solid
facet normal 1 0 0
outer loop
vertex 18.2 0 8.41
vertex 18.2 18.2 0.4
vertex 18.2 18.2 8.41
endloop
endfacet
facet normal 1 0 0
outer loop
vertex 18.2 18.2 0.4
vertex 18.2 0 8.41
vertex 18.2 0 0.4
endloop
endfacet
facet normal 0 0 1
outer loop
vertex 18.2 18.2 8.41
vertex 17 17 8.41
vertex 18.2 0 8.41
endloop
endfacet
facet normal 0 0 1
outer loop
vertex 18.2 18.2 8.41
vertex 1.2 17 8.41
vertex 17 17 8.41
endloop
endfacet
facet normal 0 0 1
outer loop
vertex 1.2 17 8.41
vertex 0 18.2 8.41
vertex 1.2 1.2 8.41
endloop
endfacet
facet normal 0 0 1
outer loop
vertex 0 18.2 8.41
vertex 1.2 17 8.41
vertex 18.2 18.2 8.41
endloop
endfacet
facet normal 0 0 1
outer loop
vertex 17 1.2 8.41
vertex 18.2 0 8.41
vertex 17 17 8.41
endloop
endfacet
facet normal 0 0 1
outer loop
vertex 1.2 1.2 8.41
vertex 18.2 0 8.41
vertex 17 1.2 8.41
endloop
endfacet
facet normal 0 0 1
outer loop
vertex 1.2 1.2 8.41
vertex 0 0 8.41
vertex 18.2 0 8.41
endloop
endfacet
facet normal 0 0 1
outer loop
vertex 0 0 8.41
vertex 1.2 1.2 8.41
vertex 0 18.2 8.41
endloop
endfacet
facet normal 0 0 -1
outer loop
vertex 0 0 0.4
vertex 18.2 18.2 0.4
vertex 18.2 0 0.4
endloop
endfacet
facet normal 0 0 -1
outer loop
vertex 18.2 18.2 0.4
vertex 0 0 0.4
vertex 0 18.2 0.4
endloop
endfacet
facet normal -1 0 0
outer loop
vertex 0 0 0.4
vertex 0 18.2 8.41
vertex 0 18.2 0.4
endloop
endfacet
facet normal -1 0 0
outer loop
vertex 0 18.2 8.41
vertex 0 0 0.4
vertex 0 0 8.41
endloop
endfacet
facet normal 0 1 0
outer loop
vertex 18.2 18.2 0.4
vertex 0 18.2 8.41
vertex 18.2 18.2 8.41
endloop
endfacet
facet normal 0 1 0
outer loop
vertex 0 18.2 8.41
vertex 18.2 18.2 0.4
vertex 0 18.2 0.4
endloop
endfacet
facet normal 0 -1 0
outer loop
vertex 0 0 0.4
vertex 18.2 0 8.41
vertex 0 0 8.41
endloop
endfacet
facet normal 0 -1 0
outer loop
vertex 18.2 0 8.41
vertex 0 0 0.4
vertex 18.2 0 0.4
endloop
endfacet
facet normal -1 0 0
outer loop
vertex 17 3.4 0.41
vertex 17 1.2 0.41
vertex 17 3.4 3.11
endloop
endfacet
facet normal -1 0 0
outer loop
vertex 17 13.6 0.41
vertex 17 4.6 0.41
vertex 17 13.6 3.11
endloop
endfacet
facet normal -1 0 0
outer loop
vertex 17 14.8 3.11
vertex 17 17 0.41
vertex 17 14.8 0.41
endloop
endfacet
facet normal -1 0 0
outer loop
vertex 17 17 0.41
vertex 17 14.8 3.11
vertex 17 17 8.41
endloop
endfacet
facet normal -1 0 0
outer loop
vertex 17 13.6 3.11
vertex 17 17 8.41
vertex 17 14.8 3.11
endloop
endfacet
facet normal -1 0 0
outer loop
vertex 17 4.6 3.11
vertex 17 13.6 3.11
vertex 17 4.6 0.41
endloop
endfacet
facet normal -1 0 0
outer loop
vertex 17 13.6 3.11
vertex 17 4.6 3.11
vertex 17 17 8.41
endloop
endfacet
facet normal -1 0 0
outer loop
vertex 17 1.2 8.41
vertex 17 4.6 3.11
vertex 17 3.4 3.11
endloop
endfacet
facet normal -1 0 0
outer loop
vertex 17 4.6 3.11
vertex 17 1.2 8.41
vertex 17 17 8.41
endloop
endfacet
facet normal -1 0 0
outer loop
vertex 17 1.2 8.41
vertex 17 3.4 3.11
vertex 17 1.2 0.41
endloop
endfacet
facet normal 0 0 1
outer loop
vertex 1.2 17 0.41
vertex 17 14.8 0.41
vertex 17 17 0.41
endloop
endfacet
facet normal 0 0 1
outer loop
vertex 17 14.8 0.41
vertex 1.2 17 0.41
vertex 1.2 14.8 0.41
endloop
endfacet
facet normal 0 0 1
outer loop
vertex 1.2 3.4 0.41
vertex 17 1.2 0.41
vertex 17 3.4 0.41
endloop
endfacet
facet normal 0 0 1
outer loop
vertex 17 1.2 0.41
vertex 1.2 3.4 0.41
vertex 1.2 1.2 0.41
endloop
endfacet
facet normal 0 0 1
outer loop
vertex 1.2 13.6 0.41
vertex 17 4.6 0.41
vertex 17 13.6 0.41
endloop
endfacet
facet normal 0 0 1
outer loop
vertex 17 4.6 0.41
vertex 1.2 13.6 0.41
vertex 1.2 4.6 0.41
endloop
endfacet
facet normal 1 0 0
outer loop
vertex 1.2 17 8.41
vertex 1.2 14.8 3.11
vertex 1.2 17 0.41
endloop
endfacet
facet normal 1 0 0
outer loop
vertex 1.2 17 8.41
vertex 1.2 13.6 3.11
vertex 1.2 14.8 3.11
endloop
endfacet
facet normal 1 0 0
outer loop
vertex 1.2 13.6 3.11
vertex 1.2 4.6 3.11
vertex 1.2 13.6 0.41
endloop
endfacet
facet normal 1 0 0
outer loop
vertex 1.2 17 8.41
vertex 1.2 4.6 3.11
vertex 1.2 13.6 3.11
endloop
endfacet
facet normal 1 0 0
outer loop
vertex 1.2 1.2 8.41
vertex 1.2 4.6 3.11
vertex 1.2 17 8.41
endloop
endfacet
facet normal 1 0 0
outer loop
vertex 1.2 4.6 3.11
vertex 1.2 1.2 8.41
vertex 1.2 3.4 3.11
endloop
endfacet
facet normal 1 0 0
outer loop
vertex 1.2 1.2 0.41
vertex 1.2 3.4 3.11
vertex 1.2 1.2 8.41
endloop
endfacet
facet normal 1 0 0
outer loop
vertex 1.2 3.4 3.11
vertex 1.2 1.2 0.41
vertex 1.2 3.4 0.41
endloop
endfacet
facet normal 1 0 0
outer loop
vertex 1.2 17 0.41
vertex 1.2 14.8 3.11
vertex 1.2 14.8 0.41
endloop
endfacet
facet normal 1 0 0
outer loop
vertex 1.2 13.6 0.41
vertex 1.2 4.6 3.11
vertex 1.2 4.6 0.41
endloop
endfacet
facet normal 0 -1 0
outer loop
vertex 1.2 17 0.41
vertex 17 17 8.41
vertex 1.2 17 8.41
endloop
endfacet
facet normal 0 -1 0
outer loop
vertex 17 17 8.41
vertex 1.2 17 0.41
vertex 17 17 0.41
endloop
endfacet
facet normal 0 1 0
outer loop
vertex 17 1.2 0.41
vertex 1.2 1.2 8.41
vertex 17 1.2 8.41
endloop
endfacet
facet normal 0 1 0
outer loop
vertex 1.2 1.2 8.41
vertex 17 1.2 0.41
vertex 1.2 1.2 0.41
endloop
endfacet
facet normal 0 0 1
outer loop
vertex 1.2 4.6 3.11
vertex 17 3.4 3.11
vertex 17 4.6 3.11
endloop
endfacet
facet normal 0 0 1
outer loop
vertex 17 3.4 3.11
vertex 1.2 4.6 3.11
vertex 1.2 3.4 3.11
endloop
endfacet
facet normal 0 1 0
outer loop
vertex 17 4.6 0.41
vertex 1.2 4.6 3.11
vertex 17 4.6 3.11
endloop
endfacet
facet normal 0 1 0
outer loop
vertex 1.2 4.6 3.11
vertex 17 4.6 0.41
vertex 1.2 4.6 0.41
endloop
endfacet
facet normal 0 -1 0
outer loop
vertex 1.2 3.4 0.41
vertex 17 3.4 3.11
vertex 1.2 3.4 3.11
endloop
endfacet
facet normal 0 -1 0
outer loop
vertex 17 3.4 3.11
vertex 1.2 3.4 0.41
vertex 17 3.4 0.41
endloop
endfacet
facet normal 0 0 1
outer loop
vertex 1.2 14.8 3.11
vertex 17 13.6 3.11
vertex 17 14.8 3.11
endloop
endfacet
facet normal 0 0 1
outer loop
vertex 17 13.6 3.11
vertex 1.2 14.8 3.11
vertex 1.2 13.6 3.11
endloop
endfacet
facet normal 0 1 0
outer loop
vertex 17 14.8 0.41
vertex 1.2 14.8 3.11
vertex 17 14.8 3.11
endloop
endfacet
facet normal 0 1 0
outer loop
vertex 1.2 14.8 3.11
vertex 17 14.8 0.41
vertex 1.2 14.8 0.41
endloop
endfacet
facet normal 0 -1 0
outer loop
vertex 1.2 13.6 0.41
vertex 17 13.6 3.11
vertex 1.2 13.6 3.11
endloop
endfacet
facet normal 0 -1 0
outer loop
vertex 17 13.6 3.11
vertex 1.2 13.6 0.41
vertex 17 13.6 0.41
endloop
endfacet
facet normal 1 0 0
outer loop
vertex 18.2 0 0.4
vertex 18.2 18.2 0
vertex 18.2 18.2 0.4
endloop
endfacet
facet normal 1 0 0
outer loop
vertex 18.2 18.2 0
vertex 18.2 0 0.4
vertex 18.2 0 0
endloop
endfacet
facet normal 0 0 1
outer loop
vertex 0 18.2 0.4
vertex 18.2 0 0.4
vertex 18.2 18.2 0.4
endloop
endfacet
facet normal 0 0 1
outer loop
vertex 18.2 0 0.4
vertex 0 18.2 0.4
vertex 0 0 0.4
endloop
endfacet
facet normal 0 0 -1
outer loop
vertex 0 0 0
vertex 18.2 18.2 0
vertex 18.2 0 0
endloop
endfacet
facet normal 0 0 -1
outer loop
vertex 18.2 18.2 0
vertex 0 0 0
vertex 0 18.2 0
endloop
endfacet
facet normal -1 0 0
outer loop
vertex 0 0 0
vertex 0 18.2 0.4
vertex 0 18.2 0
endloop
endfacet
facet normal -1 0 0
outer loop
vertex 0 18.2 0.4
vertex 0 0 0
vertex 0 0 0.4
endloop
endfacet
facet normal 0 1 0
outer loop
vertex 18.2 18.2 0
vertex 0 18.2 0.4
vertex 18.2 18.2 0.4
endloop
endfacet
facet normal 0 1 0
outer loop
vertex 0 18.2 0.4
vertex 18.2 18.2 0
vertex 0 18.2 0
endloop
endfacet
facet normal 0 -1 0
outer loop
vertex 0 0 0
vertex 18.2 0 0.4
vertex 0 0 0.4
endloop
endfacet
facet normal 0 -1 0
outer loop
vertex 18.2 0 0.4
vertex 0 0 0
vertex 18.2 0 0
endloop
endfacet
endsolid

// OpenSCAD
// file: ../../Base/Rotation.scad
// Fischertechnik Box Foundation
// Geometry Helpers Rotation

include <PlacementOptions.scad>

// getRotatedSpace(space, rotation=NoRotation)
// Rotates the space dependent on the specified rotation

function getRotatedSpace(space, rotation=NoRotation) = [
    (rotation == Rotate90 || rotation == Rotate270) ? space.y : space.x,
    (rotation == Rotate90 || rotation == Rotate270) ? space.x : space.y
];

// Rotates the given space around the fixed left lower corner
// space = the space the children needs as width/depth list [width,depth]
// rotation = 0 Rotate0 degrees, 1 Rotate90 degrees, 2 Rotate180 degrees, 3 Rotate270 degrees (equivalent to -90)

module RotateFix(space, rotation=NoRotation) {
    dy = (rotation == Rotate0 || rotation == Rotate270) ? 0 :
        (rotation == Rotate90) ? space.x :
        space.y;
    dx = (rotation < Rotate180) ? 0 :
        (rotation == Rotate180) ? space.x :
        space.y;
    
    translate([dx, dy, 0])
        rotate([0, 0, rotations[rotation]])
            children();
}
// file: ../../Base/Alignment.scad
// Fischertechnik Box Foundation
// Geometry Helpers Alignment

include <PlacementOptions.scad>

// getAlignedX(elementWidth, spaceWidth, align=AlignRight, offset=0)
// Gets the aligned X offset of an element with the given
// width in the given space.
// elementWidth = The width of the element to positon
// spaceWidth = The space where the element should be aligned
// align = 0 AlignLeft, 1 AlignCenter, 2 AlignRight
// offset = an optional offset from the aligned position. When
// aligned left or centered, then positive values are in X direction.
// When aligned right then positive values are in negative X direction.

function getAlignedX(elementWidth, spaceWidth, align=AlignRight, offset=0) =
    (align == AlignLeft) ?
        offset :
        ((align == AlignCenter) ?
        (spaceWidth - elementWidth)/2 + offset :
        spaceWidth - offset - elementWidth);

// getAlignedY(elementDepth, spaceDepth, align=AlignTop, offset=0)
// Gets the aligned Y offset of an element with the given
// depth in the given space.
// elementDepth = The depth of the element to positon
// spaceDepth = The space where the element should be aligned
// align = 0 AlignBottom, 1 AlignCenter, 2 AlignTop
// offset = an optional offset from the aligned position. When
// aligned bottom or centered, then positive values are in Y direction.
// When aligned top then positive values are in negative Y direction.

function getAlignedY(elementDepth, spaceDepth, align=AlignTop, offset=0) =
    (align == AlignBottom) ?
        offset :
        ((align == AlignCenter) ?
        (spaceDepth - elementDepth)/2 + offset :
        spaceDepth - offset - elementDepth);
// file: ../../Base/PlacementOptions.scad
// Fischertechnik Box Foundation
// Placement Options

// Alignment
NoAlign = 0;
AlignLeft = 1;
AlignBottom = 2;
AlignCenter = 3;
AlignRight = 4;
AlignTop = 5;

// Element rotation degree steps
rotations = [0, -90, -180, -270];

// Rotation
NoRotation = 0;
Rotate0 = 0;
Rotate90 = 1;
Rotate180 = 2;
Rotate270 = 3;

// Docking (seen from above)
NoDock = -1;
DockLeft = 0;
DockTop = 1;
DockRight = 2;
DockCorner = 2;
DockBottom = 3;

// Web corners
LowerLeft = 0;
UpperLeft = 1;
UpperRight = 2;
LowerRight = 3;

// Web position relative to corner
LeftOfCorner = 0;
RightOfCorner = 1;
// file: ../../Base/Boxes.scad
// Fischertechnik Box Foundation
// Pre-designed Boxes

use <Constants.scad>

include <PlacementOptions.scad>

box190Width = 190;
box190Depth = 130;
box130Width = 130;
box130Depth = 95;

// Values are from an original ec3 box
topBottomDifference = 1.5;
outerHeight = 40;
innerHeight = 38.2;
baseThickness = outerHeight - innerHeight;
stackExcess = 5.7;
radius = 3.5;
wallThickness = 1.5;
tolerance = 0.2;
stackOffset = innerHeight - stackExcess;

boxUsageHeight = stackOffset;
boxWallThickness = wallThickness;
boxBaseThickness = baseThickness;
boxWebWidth = 3.0;

// getBoxWallThickness()
// Gets the wall thickness of a Fischertechnik Box
function getBoxWallThickness() = boxWallThickness;

// getBoxUsageHeight()
// Gets the usable height of a Fischertechnik box
function getBoxUsageHeight() = boxUsageHeight;

// getBoxInnerHeight()
// Gets the inner height of a Fischertechnik box, including the stack excess
function getBoxInnerHeight() = innerHeight;

// getBoxBaseThickness()
// Gets the thickness of the Fischertechnik box base.
function getBoxBaseThickness() = boxBaseThickness;

// getBoxWebWidth()
// Gets the width of a box web
function getBoxWebWidth() = boxWebWidth;

// getBox190Space()
// Gets the usable inner space of a Box 190 as an x/y-list
function getBox190Space() = [
    box190Width - 2*getBoxWallThickness() - topBottomDifference, 
    box190Depth - 2*getBoxWallThickness() - topBottomDifference ];

// BoxBase(width, depth)
// Creates an empty stackable Fischertechnik compatible box
// width = Outer width of the box (190, 130, ...)
// depth = Outer depth of the box (130, 95, ...)

module BoxBase(width, depth, height=outerHeight) {    
    thinPlate = 0.01;

    innerHeight = height - baseThickness;    
    
    module BodyPlate(width, depth) {
        translate([radius, radius])
        hull() {
            w = width-2*radius;
            d = depth-2*radius;
            cube([w, d, thinPlate]);
            cylinder(thinPlate, r=radius, $fn=getFragments());
            translate([w, 0])
                cylinder(thinPlate, r=radius, $fn=getFragments());
            translate([w, d])
                cylinder(thinPlate, r=radius, $fn=getFragments());
            translate([0, d])
                cylinder(thinPlate, r=radius, $fn=getFragments());
        }
    }
    
    module Body(tolerance=tolerance) {
        hull() {
            // Bottom with tolerance to fit into the original boxes when stacked
            translate([-wallThickness+tolerance, -wallThickness+tolerance, -baseThickness])
                BodyPlate(width-topBottomDifference-2*tolerance, depth-topBottomDifference-2*tolerance);
            
            // Top
            translate([-wallThickness-topBottomDifference/2, -wallThickness-topBottomDifference/2, innerHeight-thinPlate])
                BodyPlate(width, depth);
         }
    }

    module Cutoff() {
        hull() {
            coWidth = width - 2*wallThickness;
            coDepth = depth - 2*wallThickness;
            
            // Bottom
            BodyPlate(coWidth-topBottomDifference, coDepth-topBottomDifference);

            // Top
            translate([-topBottomDifference/2, -topBottomDifference/2, innerHeight+thinPlate]) 
                BodyPlate(coWidth, coDepth);
        }
    }
    
    difference() {        
        Body();
        Cutoff();
        stackOffset = innerHeight - stackExcess;
        translate([0, 0, stackOffset + baseThickness])
            Body(tolerance=0);
    }
}

// Creates the Fischertechnik empty box 130x190 mm and places it at position 0,0
// 190x130 are the outer sizes, the inner space is slightly smaller. Use getBox190Space() to get the inner sizes.
// The box is positioned that the usable inner space is at the 0,0,0 position. The

module Box190() {
    BoxBase(box190Width, box190Depth);
}

// Gets the usable inner space of a Box 130 as an x/y-list
function getBox130Space() = [
    box130Width - 2*getBoxWallThickness() - topBottomDifference, 
    box130Depth - 2*getBoxWallThickness() - topBottomDifference ];

// Creates the Fischertechnik empty box 95x130 mm and places it at position 0,0
// 190x130 are the outer sizes, the inner space is slightly smaller. Use getBox190Space() to get the inner sizes.
// The box is positioned that the usable inner space is at the 0,0,0 position. The

module Box130() {
    BoxBase(box130Width, box130Depth);
}

// Creates a web at the specified box walls
// corner 0 = LowerLeft, 1 = UpperLeft, 2 = UpperRight, 3 = LowerRight
// side 0 = LeftOfCorner, 1 = RightOfCorner
// distance = Distance in mm from the corner
// boxSpace = inner width and depth of the box (default: Box 190)
// webWidth = length of the web (default is 3 mms)
// webThickness = thickness of the web (default is 1 mm)

module BoxWeb(corner, side, distance, boxSpace=getBox190Space(), webWidth=getBoxWebWidth(), webThickness=1.0) {
    sink = getBoxWallThickness()/2;

    width = (corner % 2 == 0) ? 
            (side == LeftOfCorner ? webWidth : webThickness) :
            (side == LeftOfCorner ? webThickness : webWidth);

    depth = (corner % 2 == 0) ? 
            (side == RightOfCorner ? webWidth : webThickness) :
            (side == RightOfCorner ? webThickness : webWidth);
    
    xDiff = corner == LowerLeft ? 
                (side == LeftOfCorner ? -sink : distance) :
            (corner == UpperLeft ?                
                (side == LeftOfCorner ? distance : -sink) :
            (corner == UpperRight ?
                (side == LeftOfCorner ? boxSpace.x-webWidth+sink : boxSpace.x-distance-webThickness) :
                (side == LeftOfCorner ? boxSpace.x-distance-webThickness: boxSpace.x-webWidth+sink)));

    yDiff = corner == LowerLeft ? 
                (side == RightOfCorner ? -sink : distance) :
            (corner == UpperLeft ?
                (side == RightOfCorner ? boxSpace.y-distance : boxSpace.y-webWidth+sink) :
            (corner == UpperRight ?
                (side == RightOfCorner ? boxSpace.y-webWidth+sink : boxSpace.y-distance) :
                (side == RightOfCorner ? distance : -sink)));
    
    translate([xDiff, yDiff, -getExcess()])
        cube([width, depth, boxUsageHeight + 2*getExcess()]);
}
// file: ../../Base/Placement.scad
// Fischertechnik Box Foundation
// Geometry Helpers Placement

use <Constants.scad>
use <Alignment.scad>
use <Rotation.scad>
use <Boxes.scad>

include <PlacementOptions.scad>

// Place(x=0, y=0, elementSpace=[0,0], alignX=AlignLeft, alignY=AlignBottom, rotation=Rotate0, boxSpace=getBox190Space())
// Places the child at the specified position
// y = Y-Position. This is a relative position when an X aligment is specified.
// x = X-Position. This is a relative position when an Y aligment is specified.
// elementSpace = space of the element to be placed [x,y]
// alignX = -1=NoAlign, 0 AlignLeft, 1 AlignCenter, 3 AlignRight (elementSpace and boxSpace required!)
// alignY = -1=NoAlign, 2 AlignBottom, 1 AlignCenter, 4 AlignTop (elementSpace and boxSpace required!)
// rotation = 0 Rotate0 0 degrees, 1 Rotate90 90 degrees, 
// 2 Rotate180 180 degrees, 3 Rotate270 270 degrees (equivalent to -90)
// boxSpace = Inner space of the box where the placement occurs [x,y] - default is Box 190x130 inner space

module Place(x=0, y=0, elementSpace=[0,0], 
  alignX=AlignLeft, alignY=AlignBottom, 
  rotation=NoRotation, boxSpace=getBox190Space()) {

    module Position(x, y, space, rotation=Rotate0) {
        translate([x, y, 0])
            RotateFix(space, rotation)
                children();
    }

    space = getRotatedSpace(elementSpace, rotation);
    alignedX = getAlignedX(space.x, boxSpace.x, alignX, x);
    alignedY = getAlignedY(space.y, boxSpace.y, alignY, y);
    Position(alignedX, alignedY, elementSpace, rotation)
        children();
}

// Center(space=getBox130Space(), elementSpace=[0,0])
// space = Space where the children is centered. For cylinder use centered=true and no elementSpace.
// elementSpace = space of the element to be centered [x,y]

module Center(space=getBox190Space(), elementSpace=[0,0]) {
    Place(elementSpace=elementSpace, boxSpace=space, alignX=AlignCenter, alignY=AlignCenter)
        children();
}

// CenterHorizontal(width=0, y=0, offset=0, space=getBox130Space())
// width = Width of the element to be placed.
// y = Y position of the element
// offset = Offset from the center position (negative will be left of the center)
// space = Space where the element is placed

module CenterHorizontal(width=0, y=0, offset=0, space=getBox190Space()) {
    Place(x=offset, y=y, elementSpace=[width, 0], boxSpace=space, alignX=AlignCenter)
        children(0);
}

// CenterVertical(depth=0, x=0, offset=0, space=getBox130Space())
// depth = Depth of the element to be placed.
// x = X position of the element
// offset = Offset from the center position (negative will be down of the center)
// space = Space where the element is placed

module CenterVertical(depth=0, x=0, offset=0, space=getBox190Space()) {
    Place(x=x, y=offset, elementSpace=[0, depth], boxSpace=space, alignY=AlignCenter)
        children(0);
}

// getIsVertical(align)
// True if the specified alignment needs a vertical orientation for a divider (AlignRight, AlignLeft)

function getIsVertical(align) = (align == AlignRight || align == AlignLeft);

// getIsHorizontal(align)
// True if the specified alignment needs a horizontal orientation for a divider (AlignTop, AlignBottom)

function getIsHorizontal(align) = (align == AlignTop || align == AlignBottom);
// file: ../../Elements/AxisClip10.scad
// Fischertechnik Box Library
// Axis for clip 10
// 31023

use <../ModelBase/Simple.scad>
use <../Base/Constants.scad>

width = 12;
depth = 12;
height = 23;
upperDiameter = 3.6;
clipHeight = 10;

// getAxisClip10Space()
// Gets the space of a frame for a clip 10 with spring ring (mot2)

function getAxisClip10Space() = [width, depth, height];

// AxisClip10(height, clipHeight)
// Axis for clip 10 with spring ring (mot2)
// height = Height of the complete axis
// clipHeight = Height of the rt for the clip (standard is 10, in mot3 its only 7)

module AxisClip10(height=height, clipHeight=clipHeight) {
    LeveledAxisWithSpace(height, height-clipHeight, getAxisClip10Space(), diameter=upperDiameter);
}

// Tests
color("lightgray")
AxisClip10();
// file: ../../Base/Constants.scad
// Fischertechnik Box Foundation
// Constants

// Constant values necessary for multiple elements

// Base constants
dividerThickness = 1.2;
excess = 0.01;
fragments = 90;
tolerance = 0.8;

// Gets the thickness of a divider 
function getDividerThickness() = dividerThickness;

// Gets the excess that is used to merge walls into each other
function getExcess() = excess;

// Gets amount of fragments of a cylinder
function getFragments() = fragments;

// Gets the inner tolerance of a frame to each side
function getTolerance() = tolerance;


// Fischertechnik specific constants
axisDiameter = 4;
axisBottomDiameter = axisDiameter + 1;
standardEdgeDistance = 2.5;
standardWebDistance = 11.5;
standardCornerLength = 15;
tubeWallFactor = 0.8;
smallPartsFrameHeight = 20;

// Gets axis diameter
function getAxisDiameter() = axisDiameter;

// Gets axis bottom diameter for thicker part at the bottom
function getAxisBottomDiameter() = axisBottomDiameter;

// gets the standard distance to the wall of the box for dockable frames with webs
function getStandardEdgeDistance() = standardEdgeDistance;

// gets the standard distance of each web to the corner of the dockable frame
function getStandardWebDistance() = standardWebDistance;

// gets the standard length of the corner walls of a dockable frame
function getStandardCornerLength() = standardCornerLength;

// gets the wall thickness of a tube.
function getTubeWallThickness() = tubeWallFactor * getDividerThickness();

// gets the frame height for docked small parts boxes.
function getSmallPartsFrameHeight() = smallPartsFrameHeight;
// file: ../../Elements/FrameBlockWithPin.scad
// Fischertechnik Box Library
// Frame for Building Blocks with Connector
// 38240, 37636

use <../Base/Constants.scad>
use <../ModelBase/Simple.scad>

width = 15;
depth = 15;
height = 8;

// getFrameBlockWithPinSpace()
// Gets the space the frame block with pin needs as width (.x and .y as a list)
// for the specified count of blocks

function getFrameBlockWithPinSpace(count = 1) = getFrameOuterVolume([width * count, depth, height]);

// FrameBlockWithPin(count, height=8)
// Frame for count standing building blocks with pin down
// count = Count of blocks
// height = Height of the frame (default is 8)

module FrameBlockWithPin(count = 1, height=height) {
    railWidth = getFrameBlockWithPinSpace(count).x;
    railHeight = 2.7;
    railDistance = 9;
    
    module Rails() {
        Wall([railWidth, getDividerThickness(), railHeight]);
        translate([0, railDistance + getDividerThickness()])
            Wall([railWidth, getDividerThickness(), railHeight]);
    }

    Frame([width*count, depth, height]);

    railsDepth = railDistance + 2*getDividerThickness();

    translate([0, (getFrameBlockWithPinSpace(count).y - railsDepth) / 2]) 
        Rails();
}

// Test
count = 2;
color("lightgray") {
FrameBlockWithPin(count);
}
// file: ../TestPrint.scad
// 3D Print Test Base

use <../Base/Constants.scad>

use <../Elements/AxisClip10.scad>

module TestPrint(elementSpace) {
    cube([elementSpace.x, elementSpace.y, 0.4]);
    translate([0,0,0.4+getExcess()]) {
        children();
    }
}

TestPrint(getAxisClip10Space())
    AxisClip10();
// main file
// 3D Print Test
// FrameBlockWithPin

use <../TestPrint.scad>
use <../../Elements/FrameBlockWithPin.scad>

TestPrint(getFrameBlockWithPinSpace())
    FrameBlockWithPin();
